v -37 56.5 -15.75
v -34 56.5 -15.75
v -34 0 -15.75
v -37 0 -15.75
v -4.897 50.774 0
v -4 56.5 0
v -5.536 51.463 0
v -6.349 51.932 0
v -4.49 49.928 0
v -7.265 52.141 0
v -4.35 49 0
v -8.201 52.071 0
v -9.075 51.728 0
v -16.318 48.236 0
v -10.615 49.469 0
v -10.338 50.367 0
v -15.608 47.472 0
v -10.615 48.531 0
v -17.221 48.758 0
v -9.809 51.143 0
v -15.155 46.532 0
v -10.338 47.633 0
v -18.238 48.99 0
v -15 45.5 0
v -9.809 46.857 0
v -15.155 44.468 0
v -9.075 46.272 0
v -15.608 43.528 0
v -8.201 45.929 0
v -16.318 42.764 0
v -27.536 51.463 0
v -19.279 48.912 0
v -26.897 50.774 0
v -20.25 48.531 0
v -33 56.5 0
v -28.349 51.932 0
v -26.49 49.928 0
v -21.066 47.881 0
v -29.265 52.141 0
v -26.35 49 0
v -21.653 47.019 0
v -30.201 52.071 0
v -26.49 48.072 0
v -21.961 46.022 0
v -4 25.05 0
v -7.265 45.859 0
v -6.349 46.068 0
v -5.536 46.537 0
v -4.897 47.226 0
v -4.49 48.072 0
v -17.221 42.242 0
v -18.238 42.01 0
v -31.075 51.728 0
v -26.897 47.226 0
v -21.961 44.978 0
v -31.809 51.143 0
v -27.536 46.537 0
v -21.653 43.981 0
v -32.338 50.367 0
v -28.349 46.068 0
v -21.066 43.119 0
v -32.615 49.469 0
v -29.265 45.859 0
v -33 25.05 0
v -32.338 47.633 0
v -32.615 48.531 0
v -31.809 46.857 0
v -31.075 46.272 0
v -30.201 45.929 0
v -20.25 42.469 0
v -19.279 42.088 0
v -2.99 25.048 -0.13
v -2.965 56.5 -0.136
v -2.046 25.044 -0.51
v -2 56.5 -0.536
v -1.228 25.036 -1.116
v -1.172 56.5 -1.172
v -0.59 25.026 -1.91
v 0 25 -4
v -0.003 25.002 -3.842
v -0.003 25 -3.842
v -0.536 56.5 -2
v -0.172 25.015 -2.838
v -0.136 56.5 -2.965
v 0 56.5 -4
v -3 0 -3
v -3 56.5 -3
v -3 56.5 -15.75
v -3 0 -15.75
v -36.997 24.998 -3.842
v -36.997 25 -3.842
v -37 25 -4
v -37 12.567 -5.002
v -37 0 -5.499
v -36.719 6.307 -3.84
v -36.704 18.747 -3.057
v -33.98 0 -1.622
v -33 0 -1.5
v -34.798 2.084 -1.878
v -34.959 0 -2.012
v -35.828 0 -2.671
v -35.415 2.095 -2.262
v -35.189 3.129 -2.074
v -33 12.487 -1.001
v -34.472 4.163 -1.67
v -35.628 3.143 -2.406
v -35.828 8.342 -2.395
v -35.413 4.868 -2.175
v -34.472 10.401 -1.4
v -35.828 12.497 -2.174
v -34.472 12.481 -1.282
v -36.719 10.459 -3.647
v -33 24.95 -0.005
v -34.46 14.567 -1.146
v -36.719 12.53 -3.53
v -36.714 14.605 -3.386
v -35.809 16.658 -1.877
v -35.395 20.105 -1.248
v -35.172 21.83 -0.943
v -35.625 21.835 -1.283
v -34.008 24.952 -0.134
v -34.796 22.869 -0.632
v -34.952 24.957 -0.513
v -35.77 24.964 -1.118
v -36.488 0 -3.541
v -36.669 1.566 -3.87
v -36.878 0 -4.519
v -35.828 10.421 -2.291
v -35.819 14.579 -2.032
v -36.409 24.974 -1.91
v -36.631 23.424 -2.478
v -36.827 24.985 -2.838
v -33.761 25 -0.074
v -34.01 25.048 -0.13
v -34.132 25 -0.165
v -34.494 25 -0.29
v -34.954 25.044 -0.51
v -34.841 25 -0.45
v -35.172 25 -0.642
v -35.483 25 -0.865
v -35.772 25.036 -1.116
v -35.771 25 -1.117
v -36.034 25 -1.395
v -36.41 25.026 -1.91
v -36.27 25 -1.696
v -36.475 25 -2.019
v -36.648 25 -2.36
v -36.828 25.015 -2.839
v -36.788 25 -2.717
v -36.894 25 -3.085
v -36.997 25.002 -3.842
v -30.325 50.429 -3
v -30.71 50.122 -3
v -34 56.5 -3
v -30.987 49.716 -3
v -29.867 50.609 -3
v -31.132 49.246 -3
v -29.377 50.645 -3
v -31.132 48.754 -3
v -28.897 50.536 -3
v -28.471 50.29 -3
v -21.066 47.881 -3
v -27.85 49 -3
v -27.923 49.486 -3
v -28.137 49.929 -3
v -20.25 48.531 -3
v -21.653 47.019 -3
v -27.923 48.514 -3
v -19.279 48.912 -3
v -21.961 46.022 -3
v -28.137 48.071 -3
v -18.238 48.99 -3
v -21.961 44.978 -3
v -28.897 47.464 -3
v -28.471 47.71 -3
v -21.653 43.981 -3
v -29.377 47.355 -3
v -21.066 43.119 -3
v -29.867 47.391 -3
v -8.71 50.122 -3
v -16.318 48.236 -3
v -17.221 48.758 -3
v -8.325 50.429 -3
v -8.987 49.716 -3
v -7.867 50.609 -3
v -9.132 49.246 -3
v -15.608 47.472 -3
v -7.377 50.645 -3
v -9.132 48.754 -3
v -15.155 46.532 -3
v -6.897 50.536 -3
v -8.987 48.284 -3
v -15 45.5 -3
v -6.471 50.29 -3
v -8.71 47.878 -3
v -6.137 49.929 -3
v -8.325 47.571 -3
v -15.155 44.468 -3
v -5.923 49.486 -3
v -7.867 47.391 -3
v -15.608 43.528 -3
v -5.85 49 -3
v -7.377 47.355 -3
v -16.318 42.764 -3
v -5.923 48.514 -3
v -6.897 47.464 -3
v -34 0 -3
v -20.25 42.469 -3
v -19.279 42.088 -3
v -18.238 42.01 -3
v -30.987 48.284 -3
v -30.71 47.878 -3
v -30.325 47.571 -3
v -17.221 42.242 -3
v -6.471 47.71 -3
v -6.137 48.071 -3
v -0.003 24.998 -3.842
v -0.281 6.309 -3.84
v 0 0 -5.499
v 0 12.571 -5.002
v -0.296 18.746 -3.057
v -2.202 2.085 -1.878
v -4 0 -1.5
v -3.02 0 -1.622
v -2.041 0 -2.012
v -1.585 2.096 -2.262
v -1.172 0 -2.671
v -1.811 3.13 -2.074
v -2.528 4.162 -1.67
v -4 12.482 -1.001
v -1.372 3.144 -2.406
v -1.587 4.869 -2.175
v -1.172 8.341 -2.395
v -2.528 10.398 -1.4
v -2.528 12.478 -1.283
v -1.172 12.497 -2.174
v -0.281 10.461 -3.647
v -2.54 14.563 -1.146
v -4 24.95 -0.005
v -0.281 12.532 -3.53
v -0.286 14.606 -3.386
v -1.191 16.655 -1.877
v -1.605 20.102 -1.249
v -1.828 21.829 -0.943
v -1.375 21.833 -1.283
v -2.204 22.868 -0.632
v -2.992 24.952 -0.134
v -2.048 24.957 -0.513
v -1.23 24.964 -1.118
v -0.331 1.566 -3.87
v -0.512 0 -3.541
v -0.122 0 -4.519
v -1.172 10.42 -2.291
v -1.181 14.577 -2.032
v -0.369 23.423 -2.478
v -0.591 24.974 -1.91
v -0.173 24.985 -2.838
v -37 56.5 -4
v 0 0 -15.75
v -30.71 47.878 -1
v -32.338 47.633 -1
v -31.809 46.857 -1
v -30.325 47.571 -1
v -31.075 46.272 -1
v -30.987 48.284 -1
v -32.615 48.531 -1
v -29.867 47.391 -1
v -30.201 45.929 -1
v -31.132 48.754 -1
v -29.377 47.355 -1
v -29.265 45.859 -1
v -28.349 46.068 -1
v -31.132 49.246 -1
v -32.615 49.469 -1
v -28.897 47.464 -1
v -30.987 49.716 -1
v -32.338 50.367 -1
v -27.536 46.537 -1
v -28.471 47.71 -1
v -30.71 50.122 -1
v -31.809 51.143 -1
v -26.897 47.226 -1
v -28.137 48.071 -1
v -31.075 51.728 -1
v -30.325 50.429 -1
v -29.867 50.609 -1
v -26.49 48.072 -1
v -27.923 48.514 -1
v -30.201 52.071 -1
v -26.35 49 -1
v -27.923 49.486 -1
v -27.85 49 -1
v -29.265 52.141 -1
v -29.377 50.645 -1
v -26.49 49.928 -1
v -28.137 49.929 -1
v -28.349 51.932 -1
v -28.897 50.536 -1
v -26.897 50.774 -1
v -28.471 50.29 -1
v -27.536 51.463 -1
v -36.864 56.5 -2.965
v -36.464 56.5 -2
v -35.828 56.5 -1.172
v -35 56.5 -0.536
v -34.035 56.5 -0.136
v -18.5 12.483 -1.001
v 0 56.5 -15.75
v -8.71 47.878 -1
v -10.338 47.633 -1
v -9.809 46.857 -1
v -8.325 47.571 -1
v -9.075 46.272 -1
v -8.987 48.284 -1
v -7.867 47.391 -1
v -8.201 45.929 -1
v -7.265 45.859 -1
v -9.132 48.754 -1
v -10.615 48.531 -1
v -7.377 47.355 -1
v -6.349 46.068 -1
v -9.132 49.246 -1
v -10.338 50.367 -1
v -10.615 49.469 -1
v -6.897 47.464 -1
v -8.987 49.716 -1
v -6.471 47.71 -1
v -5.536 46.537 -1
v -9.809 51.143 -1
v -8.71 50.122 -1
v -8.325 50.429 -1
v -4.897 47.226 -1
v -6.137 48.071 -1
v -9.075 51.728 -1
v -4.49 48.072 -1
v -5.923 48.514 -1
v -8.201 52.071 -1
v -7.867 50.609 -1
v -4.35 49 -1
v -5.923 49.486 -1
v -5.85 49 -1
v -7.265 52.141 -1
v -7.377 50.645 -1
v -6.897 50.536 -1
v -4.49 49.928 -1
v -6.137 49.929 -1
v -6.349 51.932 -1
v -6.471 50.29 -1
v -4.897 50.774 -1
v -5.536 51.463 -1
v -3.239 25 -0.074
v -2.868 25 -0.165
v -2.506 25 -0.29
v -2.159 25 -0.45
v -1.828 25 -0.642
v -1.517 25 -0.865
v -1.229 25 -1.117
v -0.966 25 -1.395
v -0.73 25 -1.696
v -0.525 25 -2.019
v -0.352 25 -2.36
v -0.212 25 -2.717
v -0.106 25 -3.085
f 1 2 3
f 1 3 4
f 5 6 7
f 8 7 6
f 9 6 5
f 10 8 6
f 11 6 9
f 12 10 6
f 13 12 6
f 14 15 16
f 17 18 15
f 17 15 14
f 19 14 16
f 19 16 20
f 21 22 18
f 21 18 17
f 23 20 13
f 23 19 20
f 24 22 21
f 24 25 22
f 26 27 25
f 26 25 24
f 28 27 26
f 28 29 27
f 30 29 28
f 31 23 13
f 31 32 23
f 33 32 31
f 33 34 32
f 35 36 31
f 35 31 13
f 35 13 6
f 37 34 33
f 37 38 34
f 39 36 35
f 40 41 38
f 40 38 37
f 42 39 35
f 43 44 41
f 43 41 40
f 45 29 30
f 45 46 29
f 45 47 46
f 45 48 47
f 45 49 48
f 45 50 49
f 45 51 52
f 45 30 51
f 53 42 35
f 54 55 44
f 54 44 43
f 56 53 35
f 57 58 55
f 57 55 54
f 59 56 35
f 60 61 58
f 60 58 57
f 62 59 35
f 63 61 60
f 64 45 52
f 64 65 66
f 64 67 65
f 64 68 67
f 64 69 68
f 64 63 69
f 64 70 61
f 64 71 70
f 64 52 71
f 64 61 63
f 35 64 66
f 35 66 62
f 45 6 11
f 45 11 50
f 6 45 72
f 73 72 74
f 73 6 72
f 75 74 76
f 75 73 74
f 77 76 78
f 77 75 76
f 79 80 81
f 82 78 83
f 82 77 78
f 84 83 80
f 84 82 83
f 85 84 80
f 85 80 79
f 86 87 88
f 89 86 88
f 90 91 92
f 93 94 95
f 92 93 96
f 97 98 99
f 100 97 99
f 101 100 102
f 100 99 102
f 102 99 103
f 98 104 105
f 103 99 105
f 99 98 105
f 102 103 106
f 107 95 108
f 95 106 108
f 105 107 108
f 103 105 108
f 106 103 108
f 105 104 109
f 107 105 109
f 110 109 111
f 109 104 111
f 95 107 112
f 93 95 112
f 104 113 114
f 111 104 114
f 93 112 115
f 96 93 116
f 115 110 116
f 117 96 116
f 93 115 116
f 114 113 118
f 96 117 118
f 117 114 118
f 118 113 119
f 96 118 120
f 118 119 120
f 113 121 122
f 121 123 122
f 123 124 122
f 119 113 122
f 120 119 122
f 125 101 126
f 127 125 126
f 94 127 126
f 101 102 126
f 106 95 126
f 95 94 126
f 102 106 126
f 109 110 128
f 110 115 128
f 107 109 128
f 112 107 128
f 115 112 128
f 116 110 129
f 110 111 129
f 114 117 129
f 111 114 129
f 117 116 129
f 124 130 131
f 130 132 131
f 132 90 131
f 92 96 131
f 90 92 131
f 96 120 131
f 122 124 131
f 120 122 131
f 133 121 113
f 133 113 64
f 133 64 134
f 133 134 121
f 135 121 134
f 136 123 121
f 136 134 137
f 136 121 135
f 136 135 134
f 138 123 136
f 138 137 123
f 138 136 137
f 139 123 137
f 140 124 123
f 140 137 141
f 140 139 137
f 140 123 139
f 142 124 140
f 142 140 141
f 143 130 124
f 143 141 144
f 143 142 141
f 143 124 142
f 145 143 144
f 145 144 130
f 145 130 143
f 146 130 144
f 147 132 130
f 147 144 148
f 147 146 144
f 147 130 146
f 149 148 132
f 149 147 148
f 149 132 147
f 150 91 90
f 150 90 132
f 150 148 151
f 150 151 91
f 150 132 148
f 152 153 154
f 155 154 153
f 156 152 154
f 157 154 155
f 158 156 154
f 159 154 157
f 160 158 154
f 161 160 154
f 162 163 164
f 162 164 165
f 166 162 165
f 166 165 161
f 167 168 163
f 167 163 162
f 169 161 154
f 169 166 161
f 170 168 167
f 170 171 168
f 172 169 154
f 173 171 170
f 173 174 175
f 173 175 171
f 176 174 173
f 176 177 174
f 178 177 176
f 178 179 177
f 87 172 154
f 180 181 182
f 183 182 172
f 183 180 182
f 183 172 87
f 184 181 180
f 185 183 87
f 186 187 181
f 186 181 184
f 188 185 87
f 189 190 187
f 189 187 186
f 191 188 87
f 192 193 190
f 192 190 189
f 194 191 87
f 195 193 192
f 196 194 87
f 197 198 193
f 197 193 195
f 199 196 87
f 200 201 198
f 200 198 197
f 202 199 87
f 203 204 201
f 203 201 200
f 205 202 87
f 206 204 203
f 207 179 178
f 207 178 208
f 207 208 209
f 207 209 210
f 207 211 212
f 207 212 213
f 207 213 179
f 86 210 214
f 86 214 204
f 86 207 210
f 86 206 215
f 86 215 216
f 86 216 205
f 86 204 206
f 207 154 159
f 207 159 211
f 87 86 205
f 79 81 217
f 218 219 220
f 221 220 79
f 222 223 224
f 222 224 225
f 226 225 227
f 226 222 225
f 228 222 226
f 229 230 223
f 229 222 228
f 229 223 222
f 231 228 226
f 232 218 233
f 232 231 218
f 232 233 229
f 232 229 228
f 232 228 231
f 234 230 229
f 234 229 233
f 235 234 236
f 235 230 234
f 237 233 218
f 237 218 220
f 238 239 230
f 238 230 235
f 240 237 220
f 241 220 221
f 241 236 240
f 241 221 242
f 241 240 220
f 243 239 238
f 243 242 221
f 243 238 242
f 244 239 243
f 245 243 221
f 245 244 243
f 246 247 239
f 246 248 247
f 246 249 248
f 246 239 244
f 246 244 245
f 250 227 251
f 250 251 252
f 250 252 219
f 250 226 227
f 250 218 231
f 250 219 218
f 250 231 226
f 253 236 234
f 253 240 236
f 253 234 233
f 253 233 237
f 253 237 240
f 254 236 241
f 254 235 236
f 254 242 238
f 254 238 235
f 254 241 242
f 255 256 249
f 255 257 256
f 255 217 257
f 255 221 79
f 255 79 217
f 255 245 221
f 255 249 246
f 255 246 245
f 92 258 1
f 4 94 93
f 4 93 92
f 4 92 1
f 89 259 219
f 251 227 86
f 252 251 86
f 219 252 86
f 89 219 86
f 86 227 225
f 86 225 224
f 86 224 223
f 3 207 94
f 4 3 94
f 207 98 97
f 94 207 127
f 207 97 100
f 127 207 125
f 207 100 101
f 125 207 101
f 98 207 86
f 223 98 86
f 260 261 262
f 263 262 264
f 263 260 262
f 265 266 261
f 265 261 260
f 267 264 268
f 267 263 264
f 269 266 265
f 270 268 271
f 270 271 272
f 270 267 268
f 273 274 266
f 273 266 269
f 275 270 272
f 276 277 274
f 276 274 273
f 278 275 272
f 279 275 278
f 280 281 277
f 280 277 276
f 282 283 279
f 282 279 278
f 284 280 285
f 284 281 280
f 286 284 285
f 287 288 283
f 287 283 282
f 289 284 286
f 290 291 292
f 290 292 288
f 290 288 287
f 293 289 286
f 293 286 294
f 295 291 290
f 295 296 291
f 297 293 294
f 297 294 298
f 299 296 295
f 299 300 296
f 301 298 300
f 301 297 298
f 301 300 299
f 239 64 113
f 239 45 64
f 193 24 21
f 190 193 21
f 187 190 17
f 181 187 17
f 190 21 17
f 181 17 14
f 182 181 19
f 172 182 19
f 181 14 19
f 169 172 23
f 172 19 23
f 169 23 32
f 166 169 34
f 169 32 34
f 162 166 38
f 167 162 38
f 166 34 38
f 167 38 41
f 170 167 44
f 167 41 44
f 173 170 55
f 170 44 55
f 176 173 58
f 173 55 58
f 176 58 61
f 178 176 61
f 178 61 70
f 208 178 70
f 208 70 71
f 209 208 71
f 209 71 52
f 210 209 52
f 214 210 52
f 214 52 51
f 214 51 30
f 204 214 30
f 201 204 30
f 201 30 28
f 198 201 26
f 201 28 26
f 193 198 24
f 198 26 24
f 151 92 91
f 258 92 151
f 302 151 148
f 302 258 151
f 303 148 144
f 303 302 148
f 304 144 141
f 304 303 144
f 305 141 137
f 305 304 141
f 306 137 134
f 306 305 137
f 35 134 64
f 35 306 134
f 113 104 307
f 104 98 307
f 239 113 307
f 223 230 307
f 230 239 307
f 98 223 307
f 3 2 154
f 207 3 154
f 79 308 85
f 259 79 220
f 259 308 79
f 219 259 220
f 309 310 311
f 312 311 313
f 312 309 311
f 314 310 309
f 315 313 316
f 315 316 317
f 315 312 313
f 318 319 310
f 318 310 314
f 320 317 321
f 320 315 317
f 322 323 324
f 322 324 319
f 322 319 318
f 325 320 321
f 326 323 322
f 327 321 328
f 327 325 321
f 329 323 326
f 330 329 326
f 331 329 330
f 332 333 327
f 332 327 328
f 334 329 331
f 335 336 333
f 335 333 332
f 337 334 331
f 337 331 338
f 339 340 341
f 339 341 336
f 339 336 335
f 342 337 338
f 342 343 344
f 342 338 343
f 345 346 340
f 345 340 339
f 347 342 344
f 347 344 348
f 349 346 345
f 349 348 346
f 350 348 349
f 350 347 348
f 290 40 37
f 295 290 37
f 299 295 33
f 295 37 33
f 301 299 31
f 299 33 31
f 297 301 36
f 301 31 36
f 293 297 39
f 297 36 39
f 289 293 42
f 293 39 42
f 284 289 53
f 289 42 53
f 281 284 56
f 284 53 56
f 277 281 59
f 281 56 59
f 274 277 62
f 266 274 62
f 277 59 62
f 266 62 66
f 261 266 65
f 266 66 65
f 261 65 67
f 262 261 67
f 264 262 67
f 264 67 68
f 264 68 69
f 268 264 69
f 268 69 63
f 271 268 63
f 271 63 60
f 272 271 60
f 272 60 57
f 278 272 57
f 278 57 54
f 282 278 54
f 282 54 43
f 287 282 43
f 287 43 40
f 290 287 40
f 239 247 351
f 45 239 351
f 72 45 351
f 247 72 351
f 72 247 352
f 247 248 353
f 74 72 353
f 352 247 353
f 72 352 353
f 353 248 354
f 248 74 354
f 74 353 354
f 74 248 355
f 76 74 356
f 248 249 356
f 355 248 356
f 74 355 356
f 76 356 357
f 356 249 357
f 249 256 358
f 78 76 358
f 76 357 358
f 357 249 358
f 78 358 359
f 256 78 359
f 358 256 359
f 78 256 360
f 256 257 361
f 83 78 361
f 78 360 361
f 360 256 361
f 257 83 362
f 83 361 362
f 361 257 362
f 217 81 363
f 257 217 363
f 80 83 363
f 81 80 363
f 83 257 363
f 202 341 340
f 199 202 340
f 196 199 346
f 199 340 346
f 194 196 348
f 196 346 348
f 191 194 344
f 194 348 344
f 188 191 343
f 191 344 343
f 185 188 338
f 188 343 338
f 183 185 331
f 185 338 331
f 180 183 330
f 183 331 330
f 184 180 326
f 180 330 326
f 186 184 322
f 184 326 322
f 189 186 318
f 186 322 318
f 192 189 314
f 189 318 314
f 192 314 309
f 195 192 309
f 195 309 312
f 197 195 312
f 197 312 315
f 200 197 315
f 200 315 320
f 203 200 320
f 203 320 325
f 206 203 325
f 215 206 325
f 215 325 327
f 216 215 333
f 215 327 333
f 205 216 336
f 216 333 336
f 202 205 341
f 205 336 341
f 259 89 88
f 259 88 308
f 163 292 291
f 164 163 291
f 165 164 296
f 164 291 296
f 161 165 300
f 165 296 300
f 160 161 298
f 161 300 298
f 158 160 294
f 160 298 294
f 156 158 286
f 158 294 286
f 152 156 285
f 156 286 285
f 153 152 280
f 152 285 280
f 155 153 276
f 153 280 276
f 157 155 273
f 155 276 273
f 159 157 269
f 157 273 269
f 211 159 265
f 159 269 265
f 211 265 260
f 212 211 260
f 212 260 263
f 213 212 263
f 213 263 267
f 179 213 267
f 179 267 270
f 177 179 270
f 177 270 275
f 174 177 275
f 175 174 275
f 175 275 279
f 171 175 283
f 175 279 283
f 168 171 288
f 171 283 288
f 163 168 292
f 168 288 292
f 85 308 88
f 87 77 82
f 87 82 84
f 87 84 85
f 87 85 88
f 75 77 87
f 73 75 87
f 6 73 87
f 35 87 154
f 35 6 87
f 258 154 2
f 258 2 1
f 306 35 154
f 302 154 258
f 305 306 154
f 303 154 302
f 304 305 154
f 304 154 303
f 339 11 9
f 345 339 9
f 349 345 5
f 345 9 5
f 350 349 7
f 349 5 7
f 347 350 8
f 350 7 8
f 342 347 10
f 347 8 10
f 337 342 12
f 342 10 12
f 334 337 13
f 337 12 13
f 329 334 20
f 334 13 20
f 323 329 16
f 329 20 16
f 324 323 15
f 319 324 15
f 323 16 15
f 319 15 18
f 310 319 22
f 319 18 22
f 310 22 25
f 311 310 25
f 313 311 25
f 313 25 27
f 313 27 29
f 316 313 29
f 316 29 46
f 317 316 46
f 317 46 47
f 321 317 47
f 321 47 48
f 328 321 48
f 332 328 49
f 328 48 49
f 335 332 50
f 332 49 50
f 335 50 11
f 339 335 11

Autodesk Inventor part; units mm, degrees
ref_plane "YZ Plane" through (0, 0, 0) normal (1, 0, 0) x (0, 1, 0)
ref_plane "XZ Plane" through (0, 0, 0) normal (0, 1, 0) x (-1, 0, 0)
ref_plane "XY Plane" through (0, 0, 0) normal (0, 0, 1) x (1, 0, 0)
sketch "Esquisse1" plane through (0, 0, 0) normal (0, 1, 0) x (-1, 0, 0)
  line L0 (0, 0) -> (37, 0)
  line L1 (37, 0) -> (37, -31.5)
  line L2 (37, -31.5) -> (0, -31.5)
  line L3 (0, -31.5) -> (0, 0)
  line L4 (34, -28.5) -> (34, -3)
  line L5 (34, -3) -> (3, -3)
  line L6 (3, -3) -> (3, -28.5)
  line L7 (3, -28.5) -> (34, -28.5)
  line L8 (3, -15.75) -> (0, -15.75)
  line L9 (34, -15.75) -> (37, -15.75)
  dimension "d0" = 3
  dimension "d1" = 31
  dimension "d2" = 25.5
extrude "Extrusion1" add sketch "Esquisse1" along normal blind 56.5 contours L0 L1 L9 L4 L5 L6 L8 L3
sketch "Esquisse2" plane through (-37, 0, 0) normal (0, 0, 1) x (1, 0, 0)
  line L0 (7.5, 49) -> (29.5, 49) construction
  circle A0 centre (7.5, 49) radius 1.65
  circle A1 centre (29.5, 49) radius 1.65
  line L1 (34, 0) -> (3, 0) construction
  line L2 (18.5, 0) -> (18.5, 49) construction
  point P0 (37, 0)
  dimension "d5" = 3.3
  dimension "d6" = 49
  dimension "d7" = 22
extrude "Extrusion2" cut sketch "Esquisse2" against normal through all
sketch "Esquisse3" plane through (-33, 0, 0) normal (0, 0, 1) x (1, 0, 0)
  line L0 (-4, 56.5) -> (33, 56.5) construction
  line L1 (-4, 0) -> (33, 0) construction
  circle A0 centre (3.5, 49) radius 1.65 construction
  circle A1 centre (25.5, 49) radius 1.65 construction
  circle A2 centre (3.5, 49) radius 1.65 construction
  circle A3 centre (3.5, 49) radius 3.15
  circle A4 centre (25.5, 49) radius 3.15
  line L2 (33, 0) -> (33, 56.5) projected
  line L3 (-4, 0) -> (-4, 56.5) projected
  dimension "d11" = 6.3
extrude "Extrusion3" cut sketch "Esquisse3" against normal blind 1
sketch "Esquisse4" plane through (-33, 0, 0) normal (0, 0, 1) x (1, 0, 0)
  line L0 (-4, 56.5) -> (33, 56.5) construction
  line L1 (14.5, 56.5) -> (14.5, 0) construction
  line L2 (30, 0) -> (-1, 0) construction
  circle A0 centre (14.5, 45.5) radius 3.5
  point P0 (33, 0)
  point P1 (0, 56.5)
  point P2 (29, 56.5)
  dimension "d14" = 45.5
  dimension "d15" = 7
extrude "Extrusion4" cut sketch "Esquisse4" against normal through all
sketch "Esquisse5" plane through (0, 0, 0) normal (1, 0, 0) x (0, 0, -1)
  line L0 (0, 0) -> (1.5, 0)
  line L1 (0, 0) -> (15.75, 0) projected
  line L2 (0, 0) -> (0, 56.5) projected
  spline S0 degree 2 poles (1.5, 0) (1.2491, 12.5149) (0, 25) knots 0 0 0 1 1 1
  line L3 (0, 25) -> (0, 0)
  point P0 (1, 12.5)
  dimension "d18" = 1.5
  dimension "d19" = 25
  dimension "d20" = 12.5
  dimension "d21" = 1
extrude "Extrusion5" cut sketch "Esquisse5" against normal through all
fillet "Congé2" radius 4 4 edges at (0, 12.5075, -0.9996) (0, 40.75, 0) (-37, 40.75, 0) (-37, 12.5149, -0.9991)
fillet "Congé3" radius 1 3 edges at (-18.5, 25, 0) (-1.1716, 25, -1.1716) (-35.8284, 25, -1.1716)
equation "\"d20\" = 0.5 * d19"
properties part number "part1_top"
